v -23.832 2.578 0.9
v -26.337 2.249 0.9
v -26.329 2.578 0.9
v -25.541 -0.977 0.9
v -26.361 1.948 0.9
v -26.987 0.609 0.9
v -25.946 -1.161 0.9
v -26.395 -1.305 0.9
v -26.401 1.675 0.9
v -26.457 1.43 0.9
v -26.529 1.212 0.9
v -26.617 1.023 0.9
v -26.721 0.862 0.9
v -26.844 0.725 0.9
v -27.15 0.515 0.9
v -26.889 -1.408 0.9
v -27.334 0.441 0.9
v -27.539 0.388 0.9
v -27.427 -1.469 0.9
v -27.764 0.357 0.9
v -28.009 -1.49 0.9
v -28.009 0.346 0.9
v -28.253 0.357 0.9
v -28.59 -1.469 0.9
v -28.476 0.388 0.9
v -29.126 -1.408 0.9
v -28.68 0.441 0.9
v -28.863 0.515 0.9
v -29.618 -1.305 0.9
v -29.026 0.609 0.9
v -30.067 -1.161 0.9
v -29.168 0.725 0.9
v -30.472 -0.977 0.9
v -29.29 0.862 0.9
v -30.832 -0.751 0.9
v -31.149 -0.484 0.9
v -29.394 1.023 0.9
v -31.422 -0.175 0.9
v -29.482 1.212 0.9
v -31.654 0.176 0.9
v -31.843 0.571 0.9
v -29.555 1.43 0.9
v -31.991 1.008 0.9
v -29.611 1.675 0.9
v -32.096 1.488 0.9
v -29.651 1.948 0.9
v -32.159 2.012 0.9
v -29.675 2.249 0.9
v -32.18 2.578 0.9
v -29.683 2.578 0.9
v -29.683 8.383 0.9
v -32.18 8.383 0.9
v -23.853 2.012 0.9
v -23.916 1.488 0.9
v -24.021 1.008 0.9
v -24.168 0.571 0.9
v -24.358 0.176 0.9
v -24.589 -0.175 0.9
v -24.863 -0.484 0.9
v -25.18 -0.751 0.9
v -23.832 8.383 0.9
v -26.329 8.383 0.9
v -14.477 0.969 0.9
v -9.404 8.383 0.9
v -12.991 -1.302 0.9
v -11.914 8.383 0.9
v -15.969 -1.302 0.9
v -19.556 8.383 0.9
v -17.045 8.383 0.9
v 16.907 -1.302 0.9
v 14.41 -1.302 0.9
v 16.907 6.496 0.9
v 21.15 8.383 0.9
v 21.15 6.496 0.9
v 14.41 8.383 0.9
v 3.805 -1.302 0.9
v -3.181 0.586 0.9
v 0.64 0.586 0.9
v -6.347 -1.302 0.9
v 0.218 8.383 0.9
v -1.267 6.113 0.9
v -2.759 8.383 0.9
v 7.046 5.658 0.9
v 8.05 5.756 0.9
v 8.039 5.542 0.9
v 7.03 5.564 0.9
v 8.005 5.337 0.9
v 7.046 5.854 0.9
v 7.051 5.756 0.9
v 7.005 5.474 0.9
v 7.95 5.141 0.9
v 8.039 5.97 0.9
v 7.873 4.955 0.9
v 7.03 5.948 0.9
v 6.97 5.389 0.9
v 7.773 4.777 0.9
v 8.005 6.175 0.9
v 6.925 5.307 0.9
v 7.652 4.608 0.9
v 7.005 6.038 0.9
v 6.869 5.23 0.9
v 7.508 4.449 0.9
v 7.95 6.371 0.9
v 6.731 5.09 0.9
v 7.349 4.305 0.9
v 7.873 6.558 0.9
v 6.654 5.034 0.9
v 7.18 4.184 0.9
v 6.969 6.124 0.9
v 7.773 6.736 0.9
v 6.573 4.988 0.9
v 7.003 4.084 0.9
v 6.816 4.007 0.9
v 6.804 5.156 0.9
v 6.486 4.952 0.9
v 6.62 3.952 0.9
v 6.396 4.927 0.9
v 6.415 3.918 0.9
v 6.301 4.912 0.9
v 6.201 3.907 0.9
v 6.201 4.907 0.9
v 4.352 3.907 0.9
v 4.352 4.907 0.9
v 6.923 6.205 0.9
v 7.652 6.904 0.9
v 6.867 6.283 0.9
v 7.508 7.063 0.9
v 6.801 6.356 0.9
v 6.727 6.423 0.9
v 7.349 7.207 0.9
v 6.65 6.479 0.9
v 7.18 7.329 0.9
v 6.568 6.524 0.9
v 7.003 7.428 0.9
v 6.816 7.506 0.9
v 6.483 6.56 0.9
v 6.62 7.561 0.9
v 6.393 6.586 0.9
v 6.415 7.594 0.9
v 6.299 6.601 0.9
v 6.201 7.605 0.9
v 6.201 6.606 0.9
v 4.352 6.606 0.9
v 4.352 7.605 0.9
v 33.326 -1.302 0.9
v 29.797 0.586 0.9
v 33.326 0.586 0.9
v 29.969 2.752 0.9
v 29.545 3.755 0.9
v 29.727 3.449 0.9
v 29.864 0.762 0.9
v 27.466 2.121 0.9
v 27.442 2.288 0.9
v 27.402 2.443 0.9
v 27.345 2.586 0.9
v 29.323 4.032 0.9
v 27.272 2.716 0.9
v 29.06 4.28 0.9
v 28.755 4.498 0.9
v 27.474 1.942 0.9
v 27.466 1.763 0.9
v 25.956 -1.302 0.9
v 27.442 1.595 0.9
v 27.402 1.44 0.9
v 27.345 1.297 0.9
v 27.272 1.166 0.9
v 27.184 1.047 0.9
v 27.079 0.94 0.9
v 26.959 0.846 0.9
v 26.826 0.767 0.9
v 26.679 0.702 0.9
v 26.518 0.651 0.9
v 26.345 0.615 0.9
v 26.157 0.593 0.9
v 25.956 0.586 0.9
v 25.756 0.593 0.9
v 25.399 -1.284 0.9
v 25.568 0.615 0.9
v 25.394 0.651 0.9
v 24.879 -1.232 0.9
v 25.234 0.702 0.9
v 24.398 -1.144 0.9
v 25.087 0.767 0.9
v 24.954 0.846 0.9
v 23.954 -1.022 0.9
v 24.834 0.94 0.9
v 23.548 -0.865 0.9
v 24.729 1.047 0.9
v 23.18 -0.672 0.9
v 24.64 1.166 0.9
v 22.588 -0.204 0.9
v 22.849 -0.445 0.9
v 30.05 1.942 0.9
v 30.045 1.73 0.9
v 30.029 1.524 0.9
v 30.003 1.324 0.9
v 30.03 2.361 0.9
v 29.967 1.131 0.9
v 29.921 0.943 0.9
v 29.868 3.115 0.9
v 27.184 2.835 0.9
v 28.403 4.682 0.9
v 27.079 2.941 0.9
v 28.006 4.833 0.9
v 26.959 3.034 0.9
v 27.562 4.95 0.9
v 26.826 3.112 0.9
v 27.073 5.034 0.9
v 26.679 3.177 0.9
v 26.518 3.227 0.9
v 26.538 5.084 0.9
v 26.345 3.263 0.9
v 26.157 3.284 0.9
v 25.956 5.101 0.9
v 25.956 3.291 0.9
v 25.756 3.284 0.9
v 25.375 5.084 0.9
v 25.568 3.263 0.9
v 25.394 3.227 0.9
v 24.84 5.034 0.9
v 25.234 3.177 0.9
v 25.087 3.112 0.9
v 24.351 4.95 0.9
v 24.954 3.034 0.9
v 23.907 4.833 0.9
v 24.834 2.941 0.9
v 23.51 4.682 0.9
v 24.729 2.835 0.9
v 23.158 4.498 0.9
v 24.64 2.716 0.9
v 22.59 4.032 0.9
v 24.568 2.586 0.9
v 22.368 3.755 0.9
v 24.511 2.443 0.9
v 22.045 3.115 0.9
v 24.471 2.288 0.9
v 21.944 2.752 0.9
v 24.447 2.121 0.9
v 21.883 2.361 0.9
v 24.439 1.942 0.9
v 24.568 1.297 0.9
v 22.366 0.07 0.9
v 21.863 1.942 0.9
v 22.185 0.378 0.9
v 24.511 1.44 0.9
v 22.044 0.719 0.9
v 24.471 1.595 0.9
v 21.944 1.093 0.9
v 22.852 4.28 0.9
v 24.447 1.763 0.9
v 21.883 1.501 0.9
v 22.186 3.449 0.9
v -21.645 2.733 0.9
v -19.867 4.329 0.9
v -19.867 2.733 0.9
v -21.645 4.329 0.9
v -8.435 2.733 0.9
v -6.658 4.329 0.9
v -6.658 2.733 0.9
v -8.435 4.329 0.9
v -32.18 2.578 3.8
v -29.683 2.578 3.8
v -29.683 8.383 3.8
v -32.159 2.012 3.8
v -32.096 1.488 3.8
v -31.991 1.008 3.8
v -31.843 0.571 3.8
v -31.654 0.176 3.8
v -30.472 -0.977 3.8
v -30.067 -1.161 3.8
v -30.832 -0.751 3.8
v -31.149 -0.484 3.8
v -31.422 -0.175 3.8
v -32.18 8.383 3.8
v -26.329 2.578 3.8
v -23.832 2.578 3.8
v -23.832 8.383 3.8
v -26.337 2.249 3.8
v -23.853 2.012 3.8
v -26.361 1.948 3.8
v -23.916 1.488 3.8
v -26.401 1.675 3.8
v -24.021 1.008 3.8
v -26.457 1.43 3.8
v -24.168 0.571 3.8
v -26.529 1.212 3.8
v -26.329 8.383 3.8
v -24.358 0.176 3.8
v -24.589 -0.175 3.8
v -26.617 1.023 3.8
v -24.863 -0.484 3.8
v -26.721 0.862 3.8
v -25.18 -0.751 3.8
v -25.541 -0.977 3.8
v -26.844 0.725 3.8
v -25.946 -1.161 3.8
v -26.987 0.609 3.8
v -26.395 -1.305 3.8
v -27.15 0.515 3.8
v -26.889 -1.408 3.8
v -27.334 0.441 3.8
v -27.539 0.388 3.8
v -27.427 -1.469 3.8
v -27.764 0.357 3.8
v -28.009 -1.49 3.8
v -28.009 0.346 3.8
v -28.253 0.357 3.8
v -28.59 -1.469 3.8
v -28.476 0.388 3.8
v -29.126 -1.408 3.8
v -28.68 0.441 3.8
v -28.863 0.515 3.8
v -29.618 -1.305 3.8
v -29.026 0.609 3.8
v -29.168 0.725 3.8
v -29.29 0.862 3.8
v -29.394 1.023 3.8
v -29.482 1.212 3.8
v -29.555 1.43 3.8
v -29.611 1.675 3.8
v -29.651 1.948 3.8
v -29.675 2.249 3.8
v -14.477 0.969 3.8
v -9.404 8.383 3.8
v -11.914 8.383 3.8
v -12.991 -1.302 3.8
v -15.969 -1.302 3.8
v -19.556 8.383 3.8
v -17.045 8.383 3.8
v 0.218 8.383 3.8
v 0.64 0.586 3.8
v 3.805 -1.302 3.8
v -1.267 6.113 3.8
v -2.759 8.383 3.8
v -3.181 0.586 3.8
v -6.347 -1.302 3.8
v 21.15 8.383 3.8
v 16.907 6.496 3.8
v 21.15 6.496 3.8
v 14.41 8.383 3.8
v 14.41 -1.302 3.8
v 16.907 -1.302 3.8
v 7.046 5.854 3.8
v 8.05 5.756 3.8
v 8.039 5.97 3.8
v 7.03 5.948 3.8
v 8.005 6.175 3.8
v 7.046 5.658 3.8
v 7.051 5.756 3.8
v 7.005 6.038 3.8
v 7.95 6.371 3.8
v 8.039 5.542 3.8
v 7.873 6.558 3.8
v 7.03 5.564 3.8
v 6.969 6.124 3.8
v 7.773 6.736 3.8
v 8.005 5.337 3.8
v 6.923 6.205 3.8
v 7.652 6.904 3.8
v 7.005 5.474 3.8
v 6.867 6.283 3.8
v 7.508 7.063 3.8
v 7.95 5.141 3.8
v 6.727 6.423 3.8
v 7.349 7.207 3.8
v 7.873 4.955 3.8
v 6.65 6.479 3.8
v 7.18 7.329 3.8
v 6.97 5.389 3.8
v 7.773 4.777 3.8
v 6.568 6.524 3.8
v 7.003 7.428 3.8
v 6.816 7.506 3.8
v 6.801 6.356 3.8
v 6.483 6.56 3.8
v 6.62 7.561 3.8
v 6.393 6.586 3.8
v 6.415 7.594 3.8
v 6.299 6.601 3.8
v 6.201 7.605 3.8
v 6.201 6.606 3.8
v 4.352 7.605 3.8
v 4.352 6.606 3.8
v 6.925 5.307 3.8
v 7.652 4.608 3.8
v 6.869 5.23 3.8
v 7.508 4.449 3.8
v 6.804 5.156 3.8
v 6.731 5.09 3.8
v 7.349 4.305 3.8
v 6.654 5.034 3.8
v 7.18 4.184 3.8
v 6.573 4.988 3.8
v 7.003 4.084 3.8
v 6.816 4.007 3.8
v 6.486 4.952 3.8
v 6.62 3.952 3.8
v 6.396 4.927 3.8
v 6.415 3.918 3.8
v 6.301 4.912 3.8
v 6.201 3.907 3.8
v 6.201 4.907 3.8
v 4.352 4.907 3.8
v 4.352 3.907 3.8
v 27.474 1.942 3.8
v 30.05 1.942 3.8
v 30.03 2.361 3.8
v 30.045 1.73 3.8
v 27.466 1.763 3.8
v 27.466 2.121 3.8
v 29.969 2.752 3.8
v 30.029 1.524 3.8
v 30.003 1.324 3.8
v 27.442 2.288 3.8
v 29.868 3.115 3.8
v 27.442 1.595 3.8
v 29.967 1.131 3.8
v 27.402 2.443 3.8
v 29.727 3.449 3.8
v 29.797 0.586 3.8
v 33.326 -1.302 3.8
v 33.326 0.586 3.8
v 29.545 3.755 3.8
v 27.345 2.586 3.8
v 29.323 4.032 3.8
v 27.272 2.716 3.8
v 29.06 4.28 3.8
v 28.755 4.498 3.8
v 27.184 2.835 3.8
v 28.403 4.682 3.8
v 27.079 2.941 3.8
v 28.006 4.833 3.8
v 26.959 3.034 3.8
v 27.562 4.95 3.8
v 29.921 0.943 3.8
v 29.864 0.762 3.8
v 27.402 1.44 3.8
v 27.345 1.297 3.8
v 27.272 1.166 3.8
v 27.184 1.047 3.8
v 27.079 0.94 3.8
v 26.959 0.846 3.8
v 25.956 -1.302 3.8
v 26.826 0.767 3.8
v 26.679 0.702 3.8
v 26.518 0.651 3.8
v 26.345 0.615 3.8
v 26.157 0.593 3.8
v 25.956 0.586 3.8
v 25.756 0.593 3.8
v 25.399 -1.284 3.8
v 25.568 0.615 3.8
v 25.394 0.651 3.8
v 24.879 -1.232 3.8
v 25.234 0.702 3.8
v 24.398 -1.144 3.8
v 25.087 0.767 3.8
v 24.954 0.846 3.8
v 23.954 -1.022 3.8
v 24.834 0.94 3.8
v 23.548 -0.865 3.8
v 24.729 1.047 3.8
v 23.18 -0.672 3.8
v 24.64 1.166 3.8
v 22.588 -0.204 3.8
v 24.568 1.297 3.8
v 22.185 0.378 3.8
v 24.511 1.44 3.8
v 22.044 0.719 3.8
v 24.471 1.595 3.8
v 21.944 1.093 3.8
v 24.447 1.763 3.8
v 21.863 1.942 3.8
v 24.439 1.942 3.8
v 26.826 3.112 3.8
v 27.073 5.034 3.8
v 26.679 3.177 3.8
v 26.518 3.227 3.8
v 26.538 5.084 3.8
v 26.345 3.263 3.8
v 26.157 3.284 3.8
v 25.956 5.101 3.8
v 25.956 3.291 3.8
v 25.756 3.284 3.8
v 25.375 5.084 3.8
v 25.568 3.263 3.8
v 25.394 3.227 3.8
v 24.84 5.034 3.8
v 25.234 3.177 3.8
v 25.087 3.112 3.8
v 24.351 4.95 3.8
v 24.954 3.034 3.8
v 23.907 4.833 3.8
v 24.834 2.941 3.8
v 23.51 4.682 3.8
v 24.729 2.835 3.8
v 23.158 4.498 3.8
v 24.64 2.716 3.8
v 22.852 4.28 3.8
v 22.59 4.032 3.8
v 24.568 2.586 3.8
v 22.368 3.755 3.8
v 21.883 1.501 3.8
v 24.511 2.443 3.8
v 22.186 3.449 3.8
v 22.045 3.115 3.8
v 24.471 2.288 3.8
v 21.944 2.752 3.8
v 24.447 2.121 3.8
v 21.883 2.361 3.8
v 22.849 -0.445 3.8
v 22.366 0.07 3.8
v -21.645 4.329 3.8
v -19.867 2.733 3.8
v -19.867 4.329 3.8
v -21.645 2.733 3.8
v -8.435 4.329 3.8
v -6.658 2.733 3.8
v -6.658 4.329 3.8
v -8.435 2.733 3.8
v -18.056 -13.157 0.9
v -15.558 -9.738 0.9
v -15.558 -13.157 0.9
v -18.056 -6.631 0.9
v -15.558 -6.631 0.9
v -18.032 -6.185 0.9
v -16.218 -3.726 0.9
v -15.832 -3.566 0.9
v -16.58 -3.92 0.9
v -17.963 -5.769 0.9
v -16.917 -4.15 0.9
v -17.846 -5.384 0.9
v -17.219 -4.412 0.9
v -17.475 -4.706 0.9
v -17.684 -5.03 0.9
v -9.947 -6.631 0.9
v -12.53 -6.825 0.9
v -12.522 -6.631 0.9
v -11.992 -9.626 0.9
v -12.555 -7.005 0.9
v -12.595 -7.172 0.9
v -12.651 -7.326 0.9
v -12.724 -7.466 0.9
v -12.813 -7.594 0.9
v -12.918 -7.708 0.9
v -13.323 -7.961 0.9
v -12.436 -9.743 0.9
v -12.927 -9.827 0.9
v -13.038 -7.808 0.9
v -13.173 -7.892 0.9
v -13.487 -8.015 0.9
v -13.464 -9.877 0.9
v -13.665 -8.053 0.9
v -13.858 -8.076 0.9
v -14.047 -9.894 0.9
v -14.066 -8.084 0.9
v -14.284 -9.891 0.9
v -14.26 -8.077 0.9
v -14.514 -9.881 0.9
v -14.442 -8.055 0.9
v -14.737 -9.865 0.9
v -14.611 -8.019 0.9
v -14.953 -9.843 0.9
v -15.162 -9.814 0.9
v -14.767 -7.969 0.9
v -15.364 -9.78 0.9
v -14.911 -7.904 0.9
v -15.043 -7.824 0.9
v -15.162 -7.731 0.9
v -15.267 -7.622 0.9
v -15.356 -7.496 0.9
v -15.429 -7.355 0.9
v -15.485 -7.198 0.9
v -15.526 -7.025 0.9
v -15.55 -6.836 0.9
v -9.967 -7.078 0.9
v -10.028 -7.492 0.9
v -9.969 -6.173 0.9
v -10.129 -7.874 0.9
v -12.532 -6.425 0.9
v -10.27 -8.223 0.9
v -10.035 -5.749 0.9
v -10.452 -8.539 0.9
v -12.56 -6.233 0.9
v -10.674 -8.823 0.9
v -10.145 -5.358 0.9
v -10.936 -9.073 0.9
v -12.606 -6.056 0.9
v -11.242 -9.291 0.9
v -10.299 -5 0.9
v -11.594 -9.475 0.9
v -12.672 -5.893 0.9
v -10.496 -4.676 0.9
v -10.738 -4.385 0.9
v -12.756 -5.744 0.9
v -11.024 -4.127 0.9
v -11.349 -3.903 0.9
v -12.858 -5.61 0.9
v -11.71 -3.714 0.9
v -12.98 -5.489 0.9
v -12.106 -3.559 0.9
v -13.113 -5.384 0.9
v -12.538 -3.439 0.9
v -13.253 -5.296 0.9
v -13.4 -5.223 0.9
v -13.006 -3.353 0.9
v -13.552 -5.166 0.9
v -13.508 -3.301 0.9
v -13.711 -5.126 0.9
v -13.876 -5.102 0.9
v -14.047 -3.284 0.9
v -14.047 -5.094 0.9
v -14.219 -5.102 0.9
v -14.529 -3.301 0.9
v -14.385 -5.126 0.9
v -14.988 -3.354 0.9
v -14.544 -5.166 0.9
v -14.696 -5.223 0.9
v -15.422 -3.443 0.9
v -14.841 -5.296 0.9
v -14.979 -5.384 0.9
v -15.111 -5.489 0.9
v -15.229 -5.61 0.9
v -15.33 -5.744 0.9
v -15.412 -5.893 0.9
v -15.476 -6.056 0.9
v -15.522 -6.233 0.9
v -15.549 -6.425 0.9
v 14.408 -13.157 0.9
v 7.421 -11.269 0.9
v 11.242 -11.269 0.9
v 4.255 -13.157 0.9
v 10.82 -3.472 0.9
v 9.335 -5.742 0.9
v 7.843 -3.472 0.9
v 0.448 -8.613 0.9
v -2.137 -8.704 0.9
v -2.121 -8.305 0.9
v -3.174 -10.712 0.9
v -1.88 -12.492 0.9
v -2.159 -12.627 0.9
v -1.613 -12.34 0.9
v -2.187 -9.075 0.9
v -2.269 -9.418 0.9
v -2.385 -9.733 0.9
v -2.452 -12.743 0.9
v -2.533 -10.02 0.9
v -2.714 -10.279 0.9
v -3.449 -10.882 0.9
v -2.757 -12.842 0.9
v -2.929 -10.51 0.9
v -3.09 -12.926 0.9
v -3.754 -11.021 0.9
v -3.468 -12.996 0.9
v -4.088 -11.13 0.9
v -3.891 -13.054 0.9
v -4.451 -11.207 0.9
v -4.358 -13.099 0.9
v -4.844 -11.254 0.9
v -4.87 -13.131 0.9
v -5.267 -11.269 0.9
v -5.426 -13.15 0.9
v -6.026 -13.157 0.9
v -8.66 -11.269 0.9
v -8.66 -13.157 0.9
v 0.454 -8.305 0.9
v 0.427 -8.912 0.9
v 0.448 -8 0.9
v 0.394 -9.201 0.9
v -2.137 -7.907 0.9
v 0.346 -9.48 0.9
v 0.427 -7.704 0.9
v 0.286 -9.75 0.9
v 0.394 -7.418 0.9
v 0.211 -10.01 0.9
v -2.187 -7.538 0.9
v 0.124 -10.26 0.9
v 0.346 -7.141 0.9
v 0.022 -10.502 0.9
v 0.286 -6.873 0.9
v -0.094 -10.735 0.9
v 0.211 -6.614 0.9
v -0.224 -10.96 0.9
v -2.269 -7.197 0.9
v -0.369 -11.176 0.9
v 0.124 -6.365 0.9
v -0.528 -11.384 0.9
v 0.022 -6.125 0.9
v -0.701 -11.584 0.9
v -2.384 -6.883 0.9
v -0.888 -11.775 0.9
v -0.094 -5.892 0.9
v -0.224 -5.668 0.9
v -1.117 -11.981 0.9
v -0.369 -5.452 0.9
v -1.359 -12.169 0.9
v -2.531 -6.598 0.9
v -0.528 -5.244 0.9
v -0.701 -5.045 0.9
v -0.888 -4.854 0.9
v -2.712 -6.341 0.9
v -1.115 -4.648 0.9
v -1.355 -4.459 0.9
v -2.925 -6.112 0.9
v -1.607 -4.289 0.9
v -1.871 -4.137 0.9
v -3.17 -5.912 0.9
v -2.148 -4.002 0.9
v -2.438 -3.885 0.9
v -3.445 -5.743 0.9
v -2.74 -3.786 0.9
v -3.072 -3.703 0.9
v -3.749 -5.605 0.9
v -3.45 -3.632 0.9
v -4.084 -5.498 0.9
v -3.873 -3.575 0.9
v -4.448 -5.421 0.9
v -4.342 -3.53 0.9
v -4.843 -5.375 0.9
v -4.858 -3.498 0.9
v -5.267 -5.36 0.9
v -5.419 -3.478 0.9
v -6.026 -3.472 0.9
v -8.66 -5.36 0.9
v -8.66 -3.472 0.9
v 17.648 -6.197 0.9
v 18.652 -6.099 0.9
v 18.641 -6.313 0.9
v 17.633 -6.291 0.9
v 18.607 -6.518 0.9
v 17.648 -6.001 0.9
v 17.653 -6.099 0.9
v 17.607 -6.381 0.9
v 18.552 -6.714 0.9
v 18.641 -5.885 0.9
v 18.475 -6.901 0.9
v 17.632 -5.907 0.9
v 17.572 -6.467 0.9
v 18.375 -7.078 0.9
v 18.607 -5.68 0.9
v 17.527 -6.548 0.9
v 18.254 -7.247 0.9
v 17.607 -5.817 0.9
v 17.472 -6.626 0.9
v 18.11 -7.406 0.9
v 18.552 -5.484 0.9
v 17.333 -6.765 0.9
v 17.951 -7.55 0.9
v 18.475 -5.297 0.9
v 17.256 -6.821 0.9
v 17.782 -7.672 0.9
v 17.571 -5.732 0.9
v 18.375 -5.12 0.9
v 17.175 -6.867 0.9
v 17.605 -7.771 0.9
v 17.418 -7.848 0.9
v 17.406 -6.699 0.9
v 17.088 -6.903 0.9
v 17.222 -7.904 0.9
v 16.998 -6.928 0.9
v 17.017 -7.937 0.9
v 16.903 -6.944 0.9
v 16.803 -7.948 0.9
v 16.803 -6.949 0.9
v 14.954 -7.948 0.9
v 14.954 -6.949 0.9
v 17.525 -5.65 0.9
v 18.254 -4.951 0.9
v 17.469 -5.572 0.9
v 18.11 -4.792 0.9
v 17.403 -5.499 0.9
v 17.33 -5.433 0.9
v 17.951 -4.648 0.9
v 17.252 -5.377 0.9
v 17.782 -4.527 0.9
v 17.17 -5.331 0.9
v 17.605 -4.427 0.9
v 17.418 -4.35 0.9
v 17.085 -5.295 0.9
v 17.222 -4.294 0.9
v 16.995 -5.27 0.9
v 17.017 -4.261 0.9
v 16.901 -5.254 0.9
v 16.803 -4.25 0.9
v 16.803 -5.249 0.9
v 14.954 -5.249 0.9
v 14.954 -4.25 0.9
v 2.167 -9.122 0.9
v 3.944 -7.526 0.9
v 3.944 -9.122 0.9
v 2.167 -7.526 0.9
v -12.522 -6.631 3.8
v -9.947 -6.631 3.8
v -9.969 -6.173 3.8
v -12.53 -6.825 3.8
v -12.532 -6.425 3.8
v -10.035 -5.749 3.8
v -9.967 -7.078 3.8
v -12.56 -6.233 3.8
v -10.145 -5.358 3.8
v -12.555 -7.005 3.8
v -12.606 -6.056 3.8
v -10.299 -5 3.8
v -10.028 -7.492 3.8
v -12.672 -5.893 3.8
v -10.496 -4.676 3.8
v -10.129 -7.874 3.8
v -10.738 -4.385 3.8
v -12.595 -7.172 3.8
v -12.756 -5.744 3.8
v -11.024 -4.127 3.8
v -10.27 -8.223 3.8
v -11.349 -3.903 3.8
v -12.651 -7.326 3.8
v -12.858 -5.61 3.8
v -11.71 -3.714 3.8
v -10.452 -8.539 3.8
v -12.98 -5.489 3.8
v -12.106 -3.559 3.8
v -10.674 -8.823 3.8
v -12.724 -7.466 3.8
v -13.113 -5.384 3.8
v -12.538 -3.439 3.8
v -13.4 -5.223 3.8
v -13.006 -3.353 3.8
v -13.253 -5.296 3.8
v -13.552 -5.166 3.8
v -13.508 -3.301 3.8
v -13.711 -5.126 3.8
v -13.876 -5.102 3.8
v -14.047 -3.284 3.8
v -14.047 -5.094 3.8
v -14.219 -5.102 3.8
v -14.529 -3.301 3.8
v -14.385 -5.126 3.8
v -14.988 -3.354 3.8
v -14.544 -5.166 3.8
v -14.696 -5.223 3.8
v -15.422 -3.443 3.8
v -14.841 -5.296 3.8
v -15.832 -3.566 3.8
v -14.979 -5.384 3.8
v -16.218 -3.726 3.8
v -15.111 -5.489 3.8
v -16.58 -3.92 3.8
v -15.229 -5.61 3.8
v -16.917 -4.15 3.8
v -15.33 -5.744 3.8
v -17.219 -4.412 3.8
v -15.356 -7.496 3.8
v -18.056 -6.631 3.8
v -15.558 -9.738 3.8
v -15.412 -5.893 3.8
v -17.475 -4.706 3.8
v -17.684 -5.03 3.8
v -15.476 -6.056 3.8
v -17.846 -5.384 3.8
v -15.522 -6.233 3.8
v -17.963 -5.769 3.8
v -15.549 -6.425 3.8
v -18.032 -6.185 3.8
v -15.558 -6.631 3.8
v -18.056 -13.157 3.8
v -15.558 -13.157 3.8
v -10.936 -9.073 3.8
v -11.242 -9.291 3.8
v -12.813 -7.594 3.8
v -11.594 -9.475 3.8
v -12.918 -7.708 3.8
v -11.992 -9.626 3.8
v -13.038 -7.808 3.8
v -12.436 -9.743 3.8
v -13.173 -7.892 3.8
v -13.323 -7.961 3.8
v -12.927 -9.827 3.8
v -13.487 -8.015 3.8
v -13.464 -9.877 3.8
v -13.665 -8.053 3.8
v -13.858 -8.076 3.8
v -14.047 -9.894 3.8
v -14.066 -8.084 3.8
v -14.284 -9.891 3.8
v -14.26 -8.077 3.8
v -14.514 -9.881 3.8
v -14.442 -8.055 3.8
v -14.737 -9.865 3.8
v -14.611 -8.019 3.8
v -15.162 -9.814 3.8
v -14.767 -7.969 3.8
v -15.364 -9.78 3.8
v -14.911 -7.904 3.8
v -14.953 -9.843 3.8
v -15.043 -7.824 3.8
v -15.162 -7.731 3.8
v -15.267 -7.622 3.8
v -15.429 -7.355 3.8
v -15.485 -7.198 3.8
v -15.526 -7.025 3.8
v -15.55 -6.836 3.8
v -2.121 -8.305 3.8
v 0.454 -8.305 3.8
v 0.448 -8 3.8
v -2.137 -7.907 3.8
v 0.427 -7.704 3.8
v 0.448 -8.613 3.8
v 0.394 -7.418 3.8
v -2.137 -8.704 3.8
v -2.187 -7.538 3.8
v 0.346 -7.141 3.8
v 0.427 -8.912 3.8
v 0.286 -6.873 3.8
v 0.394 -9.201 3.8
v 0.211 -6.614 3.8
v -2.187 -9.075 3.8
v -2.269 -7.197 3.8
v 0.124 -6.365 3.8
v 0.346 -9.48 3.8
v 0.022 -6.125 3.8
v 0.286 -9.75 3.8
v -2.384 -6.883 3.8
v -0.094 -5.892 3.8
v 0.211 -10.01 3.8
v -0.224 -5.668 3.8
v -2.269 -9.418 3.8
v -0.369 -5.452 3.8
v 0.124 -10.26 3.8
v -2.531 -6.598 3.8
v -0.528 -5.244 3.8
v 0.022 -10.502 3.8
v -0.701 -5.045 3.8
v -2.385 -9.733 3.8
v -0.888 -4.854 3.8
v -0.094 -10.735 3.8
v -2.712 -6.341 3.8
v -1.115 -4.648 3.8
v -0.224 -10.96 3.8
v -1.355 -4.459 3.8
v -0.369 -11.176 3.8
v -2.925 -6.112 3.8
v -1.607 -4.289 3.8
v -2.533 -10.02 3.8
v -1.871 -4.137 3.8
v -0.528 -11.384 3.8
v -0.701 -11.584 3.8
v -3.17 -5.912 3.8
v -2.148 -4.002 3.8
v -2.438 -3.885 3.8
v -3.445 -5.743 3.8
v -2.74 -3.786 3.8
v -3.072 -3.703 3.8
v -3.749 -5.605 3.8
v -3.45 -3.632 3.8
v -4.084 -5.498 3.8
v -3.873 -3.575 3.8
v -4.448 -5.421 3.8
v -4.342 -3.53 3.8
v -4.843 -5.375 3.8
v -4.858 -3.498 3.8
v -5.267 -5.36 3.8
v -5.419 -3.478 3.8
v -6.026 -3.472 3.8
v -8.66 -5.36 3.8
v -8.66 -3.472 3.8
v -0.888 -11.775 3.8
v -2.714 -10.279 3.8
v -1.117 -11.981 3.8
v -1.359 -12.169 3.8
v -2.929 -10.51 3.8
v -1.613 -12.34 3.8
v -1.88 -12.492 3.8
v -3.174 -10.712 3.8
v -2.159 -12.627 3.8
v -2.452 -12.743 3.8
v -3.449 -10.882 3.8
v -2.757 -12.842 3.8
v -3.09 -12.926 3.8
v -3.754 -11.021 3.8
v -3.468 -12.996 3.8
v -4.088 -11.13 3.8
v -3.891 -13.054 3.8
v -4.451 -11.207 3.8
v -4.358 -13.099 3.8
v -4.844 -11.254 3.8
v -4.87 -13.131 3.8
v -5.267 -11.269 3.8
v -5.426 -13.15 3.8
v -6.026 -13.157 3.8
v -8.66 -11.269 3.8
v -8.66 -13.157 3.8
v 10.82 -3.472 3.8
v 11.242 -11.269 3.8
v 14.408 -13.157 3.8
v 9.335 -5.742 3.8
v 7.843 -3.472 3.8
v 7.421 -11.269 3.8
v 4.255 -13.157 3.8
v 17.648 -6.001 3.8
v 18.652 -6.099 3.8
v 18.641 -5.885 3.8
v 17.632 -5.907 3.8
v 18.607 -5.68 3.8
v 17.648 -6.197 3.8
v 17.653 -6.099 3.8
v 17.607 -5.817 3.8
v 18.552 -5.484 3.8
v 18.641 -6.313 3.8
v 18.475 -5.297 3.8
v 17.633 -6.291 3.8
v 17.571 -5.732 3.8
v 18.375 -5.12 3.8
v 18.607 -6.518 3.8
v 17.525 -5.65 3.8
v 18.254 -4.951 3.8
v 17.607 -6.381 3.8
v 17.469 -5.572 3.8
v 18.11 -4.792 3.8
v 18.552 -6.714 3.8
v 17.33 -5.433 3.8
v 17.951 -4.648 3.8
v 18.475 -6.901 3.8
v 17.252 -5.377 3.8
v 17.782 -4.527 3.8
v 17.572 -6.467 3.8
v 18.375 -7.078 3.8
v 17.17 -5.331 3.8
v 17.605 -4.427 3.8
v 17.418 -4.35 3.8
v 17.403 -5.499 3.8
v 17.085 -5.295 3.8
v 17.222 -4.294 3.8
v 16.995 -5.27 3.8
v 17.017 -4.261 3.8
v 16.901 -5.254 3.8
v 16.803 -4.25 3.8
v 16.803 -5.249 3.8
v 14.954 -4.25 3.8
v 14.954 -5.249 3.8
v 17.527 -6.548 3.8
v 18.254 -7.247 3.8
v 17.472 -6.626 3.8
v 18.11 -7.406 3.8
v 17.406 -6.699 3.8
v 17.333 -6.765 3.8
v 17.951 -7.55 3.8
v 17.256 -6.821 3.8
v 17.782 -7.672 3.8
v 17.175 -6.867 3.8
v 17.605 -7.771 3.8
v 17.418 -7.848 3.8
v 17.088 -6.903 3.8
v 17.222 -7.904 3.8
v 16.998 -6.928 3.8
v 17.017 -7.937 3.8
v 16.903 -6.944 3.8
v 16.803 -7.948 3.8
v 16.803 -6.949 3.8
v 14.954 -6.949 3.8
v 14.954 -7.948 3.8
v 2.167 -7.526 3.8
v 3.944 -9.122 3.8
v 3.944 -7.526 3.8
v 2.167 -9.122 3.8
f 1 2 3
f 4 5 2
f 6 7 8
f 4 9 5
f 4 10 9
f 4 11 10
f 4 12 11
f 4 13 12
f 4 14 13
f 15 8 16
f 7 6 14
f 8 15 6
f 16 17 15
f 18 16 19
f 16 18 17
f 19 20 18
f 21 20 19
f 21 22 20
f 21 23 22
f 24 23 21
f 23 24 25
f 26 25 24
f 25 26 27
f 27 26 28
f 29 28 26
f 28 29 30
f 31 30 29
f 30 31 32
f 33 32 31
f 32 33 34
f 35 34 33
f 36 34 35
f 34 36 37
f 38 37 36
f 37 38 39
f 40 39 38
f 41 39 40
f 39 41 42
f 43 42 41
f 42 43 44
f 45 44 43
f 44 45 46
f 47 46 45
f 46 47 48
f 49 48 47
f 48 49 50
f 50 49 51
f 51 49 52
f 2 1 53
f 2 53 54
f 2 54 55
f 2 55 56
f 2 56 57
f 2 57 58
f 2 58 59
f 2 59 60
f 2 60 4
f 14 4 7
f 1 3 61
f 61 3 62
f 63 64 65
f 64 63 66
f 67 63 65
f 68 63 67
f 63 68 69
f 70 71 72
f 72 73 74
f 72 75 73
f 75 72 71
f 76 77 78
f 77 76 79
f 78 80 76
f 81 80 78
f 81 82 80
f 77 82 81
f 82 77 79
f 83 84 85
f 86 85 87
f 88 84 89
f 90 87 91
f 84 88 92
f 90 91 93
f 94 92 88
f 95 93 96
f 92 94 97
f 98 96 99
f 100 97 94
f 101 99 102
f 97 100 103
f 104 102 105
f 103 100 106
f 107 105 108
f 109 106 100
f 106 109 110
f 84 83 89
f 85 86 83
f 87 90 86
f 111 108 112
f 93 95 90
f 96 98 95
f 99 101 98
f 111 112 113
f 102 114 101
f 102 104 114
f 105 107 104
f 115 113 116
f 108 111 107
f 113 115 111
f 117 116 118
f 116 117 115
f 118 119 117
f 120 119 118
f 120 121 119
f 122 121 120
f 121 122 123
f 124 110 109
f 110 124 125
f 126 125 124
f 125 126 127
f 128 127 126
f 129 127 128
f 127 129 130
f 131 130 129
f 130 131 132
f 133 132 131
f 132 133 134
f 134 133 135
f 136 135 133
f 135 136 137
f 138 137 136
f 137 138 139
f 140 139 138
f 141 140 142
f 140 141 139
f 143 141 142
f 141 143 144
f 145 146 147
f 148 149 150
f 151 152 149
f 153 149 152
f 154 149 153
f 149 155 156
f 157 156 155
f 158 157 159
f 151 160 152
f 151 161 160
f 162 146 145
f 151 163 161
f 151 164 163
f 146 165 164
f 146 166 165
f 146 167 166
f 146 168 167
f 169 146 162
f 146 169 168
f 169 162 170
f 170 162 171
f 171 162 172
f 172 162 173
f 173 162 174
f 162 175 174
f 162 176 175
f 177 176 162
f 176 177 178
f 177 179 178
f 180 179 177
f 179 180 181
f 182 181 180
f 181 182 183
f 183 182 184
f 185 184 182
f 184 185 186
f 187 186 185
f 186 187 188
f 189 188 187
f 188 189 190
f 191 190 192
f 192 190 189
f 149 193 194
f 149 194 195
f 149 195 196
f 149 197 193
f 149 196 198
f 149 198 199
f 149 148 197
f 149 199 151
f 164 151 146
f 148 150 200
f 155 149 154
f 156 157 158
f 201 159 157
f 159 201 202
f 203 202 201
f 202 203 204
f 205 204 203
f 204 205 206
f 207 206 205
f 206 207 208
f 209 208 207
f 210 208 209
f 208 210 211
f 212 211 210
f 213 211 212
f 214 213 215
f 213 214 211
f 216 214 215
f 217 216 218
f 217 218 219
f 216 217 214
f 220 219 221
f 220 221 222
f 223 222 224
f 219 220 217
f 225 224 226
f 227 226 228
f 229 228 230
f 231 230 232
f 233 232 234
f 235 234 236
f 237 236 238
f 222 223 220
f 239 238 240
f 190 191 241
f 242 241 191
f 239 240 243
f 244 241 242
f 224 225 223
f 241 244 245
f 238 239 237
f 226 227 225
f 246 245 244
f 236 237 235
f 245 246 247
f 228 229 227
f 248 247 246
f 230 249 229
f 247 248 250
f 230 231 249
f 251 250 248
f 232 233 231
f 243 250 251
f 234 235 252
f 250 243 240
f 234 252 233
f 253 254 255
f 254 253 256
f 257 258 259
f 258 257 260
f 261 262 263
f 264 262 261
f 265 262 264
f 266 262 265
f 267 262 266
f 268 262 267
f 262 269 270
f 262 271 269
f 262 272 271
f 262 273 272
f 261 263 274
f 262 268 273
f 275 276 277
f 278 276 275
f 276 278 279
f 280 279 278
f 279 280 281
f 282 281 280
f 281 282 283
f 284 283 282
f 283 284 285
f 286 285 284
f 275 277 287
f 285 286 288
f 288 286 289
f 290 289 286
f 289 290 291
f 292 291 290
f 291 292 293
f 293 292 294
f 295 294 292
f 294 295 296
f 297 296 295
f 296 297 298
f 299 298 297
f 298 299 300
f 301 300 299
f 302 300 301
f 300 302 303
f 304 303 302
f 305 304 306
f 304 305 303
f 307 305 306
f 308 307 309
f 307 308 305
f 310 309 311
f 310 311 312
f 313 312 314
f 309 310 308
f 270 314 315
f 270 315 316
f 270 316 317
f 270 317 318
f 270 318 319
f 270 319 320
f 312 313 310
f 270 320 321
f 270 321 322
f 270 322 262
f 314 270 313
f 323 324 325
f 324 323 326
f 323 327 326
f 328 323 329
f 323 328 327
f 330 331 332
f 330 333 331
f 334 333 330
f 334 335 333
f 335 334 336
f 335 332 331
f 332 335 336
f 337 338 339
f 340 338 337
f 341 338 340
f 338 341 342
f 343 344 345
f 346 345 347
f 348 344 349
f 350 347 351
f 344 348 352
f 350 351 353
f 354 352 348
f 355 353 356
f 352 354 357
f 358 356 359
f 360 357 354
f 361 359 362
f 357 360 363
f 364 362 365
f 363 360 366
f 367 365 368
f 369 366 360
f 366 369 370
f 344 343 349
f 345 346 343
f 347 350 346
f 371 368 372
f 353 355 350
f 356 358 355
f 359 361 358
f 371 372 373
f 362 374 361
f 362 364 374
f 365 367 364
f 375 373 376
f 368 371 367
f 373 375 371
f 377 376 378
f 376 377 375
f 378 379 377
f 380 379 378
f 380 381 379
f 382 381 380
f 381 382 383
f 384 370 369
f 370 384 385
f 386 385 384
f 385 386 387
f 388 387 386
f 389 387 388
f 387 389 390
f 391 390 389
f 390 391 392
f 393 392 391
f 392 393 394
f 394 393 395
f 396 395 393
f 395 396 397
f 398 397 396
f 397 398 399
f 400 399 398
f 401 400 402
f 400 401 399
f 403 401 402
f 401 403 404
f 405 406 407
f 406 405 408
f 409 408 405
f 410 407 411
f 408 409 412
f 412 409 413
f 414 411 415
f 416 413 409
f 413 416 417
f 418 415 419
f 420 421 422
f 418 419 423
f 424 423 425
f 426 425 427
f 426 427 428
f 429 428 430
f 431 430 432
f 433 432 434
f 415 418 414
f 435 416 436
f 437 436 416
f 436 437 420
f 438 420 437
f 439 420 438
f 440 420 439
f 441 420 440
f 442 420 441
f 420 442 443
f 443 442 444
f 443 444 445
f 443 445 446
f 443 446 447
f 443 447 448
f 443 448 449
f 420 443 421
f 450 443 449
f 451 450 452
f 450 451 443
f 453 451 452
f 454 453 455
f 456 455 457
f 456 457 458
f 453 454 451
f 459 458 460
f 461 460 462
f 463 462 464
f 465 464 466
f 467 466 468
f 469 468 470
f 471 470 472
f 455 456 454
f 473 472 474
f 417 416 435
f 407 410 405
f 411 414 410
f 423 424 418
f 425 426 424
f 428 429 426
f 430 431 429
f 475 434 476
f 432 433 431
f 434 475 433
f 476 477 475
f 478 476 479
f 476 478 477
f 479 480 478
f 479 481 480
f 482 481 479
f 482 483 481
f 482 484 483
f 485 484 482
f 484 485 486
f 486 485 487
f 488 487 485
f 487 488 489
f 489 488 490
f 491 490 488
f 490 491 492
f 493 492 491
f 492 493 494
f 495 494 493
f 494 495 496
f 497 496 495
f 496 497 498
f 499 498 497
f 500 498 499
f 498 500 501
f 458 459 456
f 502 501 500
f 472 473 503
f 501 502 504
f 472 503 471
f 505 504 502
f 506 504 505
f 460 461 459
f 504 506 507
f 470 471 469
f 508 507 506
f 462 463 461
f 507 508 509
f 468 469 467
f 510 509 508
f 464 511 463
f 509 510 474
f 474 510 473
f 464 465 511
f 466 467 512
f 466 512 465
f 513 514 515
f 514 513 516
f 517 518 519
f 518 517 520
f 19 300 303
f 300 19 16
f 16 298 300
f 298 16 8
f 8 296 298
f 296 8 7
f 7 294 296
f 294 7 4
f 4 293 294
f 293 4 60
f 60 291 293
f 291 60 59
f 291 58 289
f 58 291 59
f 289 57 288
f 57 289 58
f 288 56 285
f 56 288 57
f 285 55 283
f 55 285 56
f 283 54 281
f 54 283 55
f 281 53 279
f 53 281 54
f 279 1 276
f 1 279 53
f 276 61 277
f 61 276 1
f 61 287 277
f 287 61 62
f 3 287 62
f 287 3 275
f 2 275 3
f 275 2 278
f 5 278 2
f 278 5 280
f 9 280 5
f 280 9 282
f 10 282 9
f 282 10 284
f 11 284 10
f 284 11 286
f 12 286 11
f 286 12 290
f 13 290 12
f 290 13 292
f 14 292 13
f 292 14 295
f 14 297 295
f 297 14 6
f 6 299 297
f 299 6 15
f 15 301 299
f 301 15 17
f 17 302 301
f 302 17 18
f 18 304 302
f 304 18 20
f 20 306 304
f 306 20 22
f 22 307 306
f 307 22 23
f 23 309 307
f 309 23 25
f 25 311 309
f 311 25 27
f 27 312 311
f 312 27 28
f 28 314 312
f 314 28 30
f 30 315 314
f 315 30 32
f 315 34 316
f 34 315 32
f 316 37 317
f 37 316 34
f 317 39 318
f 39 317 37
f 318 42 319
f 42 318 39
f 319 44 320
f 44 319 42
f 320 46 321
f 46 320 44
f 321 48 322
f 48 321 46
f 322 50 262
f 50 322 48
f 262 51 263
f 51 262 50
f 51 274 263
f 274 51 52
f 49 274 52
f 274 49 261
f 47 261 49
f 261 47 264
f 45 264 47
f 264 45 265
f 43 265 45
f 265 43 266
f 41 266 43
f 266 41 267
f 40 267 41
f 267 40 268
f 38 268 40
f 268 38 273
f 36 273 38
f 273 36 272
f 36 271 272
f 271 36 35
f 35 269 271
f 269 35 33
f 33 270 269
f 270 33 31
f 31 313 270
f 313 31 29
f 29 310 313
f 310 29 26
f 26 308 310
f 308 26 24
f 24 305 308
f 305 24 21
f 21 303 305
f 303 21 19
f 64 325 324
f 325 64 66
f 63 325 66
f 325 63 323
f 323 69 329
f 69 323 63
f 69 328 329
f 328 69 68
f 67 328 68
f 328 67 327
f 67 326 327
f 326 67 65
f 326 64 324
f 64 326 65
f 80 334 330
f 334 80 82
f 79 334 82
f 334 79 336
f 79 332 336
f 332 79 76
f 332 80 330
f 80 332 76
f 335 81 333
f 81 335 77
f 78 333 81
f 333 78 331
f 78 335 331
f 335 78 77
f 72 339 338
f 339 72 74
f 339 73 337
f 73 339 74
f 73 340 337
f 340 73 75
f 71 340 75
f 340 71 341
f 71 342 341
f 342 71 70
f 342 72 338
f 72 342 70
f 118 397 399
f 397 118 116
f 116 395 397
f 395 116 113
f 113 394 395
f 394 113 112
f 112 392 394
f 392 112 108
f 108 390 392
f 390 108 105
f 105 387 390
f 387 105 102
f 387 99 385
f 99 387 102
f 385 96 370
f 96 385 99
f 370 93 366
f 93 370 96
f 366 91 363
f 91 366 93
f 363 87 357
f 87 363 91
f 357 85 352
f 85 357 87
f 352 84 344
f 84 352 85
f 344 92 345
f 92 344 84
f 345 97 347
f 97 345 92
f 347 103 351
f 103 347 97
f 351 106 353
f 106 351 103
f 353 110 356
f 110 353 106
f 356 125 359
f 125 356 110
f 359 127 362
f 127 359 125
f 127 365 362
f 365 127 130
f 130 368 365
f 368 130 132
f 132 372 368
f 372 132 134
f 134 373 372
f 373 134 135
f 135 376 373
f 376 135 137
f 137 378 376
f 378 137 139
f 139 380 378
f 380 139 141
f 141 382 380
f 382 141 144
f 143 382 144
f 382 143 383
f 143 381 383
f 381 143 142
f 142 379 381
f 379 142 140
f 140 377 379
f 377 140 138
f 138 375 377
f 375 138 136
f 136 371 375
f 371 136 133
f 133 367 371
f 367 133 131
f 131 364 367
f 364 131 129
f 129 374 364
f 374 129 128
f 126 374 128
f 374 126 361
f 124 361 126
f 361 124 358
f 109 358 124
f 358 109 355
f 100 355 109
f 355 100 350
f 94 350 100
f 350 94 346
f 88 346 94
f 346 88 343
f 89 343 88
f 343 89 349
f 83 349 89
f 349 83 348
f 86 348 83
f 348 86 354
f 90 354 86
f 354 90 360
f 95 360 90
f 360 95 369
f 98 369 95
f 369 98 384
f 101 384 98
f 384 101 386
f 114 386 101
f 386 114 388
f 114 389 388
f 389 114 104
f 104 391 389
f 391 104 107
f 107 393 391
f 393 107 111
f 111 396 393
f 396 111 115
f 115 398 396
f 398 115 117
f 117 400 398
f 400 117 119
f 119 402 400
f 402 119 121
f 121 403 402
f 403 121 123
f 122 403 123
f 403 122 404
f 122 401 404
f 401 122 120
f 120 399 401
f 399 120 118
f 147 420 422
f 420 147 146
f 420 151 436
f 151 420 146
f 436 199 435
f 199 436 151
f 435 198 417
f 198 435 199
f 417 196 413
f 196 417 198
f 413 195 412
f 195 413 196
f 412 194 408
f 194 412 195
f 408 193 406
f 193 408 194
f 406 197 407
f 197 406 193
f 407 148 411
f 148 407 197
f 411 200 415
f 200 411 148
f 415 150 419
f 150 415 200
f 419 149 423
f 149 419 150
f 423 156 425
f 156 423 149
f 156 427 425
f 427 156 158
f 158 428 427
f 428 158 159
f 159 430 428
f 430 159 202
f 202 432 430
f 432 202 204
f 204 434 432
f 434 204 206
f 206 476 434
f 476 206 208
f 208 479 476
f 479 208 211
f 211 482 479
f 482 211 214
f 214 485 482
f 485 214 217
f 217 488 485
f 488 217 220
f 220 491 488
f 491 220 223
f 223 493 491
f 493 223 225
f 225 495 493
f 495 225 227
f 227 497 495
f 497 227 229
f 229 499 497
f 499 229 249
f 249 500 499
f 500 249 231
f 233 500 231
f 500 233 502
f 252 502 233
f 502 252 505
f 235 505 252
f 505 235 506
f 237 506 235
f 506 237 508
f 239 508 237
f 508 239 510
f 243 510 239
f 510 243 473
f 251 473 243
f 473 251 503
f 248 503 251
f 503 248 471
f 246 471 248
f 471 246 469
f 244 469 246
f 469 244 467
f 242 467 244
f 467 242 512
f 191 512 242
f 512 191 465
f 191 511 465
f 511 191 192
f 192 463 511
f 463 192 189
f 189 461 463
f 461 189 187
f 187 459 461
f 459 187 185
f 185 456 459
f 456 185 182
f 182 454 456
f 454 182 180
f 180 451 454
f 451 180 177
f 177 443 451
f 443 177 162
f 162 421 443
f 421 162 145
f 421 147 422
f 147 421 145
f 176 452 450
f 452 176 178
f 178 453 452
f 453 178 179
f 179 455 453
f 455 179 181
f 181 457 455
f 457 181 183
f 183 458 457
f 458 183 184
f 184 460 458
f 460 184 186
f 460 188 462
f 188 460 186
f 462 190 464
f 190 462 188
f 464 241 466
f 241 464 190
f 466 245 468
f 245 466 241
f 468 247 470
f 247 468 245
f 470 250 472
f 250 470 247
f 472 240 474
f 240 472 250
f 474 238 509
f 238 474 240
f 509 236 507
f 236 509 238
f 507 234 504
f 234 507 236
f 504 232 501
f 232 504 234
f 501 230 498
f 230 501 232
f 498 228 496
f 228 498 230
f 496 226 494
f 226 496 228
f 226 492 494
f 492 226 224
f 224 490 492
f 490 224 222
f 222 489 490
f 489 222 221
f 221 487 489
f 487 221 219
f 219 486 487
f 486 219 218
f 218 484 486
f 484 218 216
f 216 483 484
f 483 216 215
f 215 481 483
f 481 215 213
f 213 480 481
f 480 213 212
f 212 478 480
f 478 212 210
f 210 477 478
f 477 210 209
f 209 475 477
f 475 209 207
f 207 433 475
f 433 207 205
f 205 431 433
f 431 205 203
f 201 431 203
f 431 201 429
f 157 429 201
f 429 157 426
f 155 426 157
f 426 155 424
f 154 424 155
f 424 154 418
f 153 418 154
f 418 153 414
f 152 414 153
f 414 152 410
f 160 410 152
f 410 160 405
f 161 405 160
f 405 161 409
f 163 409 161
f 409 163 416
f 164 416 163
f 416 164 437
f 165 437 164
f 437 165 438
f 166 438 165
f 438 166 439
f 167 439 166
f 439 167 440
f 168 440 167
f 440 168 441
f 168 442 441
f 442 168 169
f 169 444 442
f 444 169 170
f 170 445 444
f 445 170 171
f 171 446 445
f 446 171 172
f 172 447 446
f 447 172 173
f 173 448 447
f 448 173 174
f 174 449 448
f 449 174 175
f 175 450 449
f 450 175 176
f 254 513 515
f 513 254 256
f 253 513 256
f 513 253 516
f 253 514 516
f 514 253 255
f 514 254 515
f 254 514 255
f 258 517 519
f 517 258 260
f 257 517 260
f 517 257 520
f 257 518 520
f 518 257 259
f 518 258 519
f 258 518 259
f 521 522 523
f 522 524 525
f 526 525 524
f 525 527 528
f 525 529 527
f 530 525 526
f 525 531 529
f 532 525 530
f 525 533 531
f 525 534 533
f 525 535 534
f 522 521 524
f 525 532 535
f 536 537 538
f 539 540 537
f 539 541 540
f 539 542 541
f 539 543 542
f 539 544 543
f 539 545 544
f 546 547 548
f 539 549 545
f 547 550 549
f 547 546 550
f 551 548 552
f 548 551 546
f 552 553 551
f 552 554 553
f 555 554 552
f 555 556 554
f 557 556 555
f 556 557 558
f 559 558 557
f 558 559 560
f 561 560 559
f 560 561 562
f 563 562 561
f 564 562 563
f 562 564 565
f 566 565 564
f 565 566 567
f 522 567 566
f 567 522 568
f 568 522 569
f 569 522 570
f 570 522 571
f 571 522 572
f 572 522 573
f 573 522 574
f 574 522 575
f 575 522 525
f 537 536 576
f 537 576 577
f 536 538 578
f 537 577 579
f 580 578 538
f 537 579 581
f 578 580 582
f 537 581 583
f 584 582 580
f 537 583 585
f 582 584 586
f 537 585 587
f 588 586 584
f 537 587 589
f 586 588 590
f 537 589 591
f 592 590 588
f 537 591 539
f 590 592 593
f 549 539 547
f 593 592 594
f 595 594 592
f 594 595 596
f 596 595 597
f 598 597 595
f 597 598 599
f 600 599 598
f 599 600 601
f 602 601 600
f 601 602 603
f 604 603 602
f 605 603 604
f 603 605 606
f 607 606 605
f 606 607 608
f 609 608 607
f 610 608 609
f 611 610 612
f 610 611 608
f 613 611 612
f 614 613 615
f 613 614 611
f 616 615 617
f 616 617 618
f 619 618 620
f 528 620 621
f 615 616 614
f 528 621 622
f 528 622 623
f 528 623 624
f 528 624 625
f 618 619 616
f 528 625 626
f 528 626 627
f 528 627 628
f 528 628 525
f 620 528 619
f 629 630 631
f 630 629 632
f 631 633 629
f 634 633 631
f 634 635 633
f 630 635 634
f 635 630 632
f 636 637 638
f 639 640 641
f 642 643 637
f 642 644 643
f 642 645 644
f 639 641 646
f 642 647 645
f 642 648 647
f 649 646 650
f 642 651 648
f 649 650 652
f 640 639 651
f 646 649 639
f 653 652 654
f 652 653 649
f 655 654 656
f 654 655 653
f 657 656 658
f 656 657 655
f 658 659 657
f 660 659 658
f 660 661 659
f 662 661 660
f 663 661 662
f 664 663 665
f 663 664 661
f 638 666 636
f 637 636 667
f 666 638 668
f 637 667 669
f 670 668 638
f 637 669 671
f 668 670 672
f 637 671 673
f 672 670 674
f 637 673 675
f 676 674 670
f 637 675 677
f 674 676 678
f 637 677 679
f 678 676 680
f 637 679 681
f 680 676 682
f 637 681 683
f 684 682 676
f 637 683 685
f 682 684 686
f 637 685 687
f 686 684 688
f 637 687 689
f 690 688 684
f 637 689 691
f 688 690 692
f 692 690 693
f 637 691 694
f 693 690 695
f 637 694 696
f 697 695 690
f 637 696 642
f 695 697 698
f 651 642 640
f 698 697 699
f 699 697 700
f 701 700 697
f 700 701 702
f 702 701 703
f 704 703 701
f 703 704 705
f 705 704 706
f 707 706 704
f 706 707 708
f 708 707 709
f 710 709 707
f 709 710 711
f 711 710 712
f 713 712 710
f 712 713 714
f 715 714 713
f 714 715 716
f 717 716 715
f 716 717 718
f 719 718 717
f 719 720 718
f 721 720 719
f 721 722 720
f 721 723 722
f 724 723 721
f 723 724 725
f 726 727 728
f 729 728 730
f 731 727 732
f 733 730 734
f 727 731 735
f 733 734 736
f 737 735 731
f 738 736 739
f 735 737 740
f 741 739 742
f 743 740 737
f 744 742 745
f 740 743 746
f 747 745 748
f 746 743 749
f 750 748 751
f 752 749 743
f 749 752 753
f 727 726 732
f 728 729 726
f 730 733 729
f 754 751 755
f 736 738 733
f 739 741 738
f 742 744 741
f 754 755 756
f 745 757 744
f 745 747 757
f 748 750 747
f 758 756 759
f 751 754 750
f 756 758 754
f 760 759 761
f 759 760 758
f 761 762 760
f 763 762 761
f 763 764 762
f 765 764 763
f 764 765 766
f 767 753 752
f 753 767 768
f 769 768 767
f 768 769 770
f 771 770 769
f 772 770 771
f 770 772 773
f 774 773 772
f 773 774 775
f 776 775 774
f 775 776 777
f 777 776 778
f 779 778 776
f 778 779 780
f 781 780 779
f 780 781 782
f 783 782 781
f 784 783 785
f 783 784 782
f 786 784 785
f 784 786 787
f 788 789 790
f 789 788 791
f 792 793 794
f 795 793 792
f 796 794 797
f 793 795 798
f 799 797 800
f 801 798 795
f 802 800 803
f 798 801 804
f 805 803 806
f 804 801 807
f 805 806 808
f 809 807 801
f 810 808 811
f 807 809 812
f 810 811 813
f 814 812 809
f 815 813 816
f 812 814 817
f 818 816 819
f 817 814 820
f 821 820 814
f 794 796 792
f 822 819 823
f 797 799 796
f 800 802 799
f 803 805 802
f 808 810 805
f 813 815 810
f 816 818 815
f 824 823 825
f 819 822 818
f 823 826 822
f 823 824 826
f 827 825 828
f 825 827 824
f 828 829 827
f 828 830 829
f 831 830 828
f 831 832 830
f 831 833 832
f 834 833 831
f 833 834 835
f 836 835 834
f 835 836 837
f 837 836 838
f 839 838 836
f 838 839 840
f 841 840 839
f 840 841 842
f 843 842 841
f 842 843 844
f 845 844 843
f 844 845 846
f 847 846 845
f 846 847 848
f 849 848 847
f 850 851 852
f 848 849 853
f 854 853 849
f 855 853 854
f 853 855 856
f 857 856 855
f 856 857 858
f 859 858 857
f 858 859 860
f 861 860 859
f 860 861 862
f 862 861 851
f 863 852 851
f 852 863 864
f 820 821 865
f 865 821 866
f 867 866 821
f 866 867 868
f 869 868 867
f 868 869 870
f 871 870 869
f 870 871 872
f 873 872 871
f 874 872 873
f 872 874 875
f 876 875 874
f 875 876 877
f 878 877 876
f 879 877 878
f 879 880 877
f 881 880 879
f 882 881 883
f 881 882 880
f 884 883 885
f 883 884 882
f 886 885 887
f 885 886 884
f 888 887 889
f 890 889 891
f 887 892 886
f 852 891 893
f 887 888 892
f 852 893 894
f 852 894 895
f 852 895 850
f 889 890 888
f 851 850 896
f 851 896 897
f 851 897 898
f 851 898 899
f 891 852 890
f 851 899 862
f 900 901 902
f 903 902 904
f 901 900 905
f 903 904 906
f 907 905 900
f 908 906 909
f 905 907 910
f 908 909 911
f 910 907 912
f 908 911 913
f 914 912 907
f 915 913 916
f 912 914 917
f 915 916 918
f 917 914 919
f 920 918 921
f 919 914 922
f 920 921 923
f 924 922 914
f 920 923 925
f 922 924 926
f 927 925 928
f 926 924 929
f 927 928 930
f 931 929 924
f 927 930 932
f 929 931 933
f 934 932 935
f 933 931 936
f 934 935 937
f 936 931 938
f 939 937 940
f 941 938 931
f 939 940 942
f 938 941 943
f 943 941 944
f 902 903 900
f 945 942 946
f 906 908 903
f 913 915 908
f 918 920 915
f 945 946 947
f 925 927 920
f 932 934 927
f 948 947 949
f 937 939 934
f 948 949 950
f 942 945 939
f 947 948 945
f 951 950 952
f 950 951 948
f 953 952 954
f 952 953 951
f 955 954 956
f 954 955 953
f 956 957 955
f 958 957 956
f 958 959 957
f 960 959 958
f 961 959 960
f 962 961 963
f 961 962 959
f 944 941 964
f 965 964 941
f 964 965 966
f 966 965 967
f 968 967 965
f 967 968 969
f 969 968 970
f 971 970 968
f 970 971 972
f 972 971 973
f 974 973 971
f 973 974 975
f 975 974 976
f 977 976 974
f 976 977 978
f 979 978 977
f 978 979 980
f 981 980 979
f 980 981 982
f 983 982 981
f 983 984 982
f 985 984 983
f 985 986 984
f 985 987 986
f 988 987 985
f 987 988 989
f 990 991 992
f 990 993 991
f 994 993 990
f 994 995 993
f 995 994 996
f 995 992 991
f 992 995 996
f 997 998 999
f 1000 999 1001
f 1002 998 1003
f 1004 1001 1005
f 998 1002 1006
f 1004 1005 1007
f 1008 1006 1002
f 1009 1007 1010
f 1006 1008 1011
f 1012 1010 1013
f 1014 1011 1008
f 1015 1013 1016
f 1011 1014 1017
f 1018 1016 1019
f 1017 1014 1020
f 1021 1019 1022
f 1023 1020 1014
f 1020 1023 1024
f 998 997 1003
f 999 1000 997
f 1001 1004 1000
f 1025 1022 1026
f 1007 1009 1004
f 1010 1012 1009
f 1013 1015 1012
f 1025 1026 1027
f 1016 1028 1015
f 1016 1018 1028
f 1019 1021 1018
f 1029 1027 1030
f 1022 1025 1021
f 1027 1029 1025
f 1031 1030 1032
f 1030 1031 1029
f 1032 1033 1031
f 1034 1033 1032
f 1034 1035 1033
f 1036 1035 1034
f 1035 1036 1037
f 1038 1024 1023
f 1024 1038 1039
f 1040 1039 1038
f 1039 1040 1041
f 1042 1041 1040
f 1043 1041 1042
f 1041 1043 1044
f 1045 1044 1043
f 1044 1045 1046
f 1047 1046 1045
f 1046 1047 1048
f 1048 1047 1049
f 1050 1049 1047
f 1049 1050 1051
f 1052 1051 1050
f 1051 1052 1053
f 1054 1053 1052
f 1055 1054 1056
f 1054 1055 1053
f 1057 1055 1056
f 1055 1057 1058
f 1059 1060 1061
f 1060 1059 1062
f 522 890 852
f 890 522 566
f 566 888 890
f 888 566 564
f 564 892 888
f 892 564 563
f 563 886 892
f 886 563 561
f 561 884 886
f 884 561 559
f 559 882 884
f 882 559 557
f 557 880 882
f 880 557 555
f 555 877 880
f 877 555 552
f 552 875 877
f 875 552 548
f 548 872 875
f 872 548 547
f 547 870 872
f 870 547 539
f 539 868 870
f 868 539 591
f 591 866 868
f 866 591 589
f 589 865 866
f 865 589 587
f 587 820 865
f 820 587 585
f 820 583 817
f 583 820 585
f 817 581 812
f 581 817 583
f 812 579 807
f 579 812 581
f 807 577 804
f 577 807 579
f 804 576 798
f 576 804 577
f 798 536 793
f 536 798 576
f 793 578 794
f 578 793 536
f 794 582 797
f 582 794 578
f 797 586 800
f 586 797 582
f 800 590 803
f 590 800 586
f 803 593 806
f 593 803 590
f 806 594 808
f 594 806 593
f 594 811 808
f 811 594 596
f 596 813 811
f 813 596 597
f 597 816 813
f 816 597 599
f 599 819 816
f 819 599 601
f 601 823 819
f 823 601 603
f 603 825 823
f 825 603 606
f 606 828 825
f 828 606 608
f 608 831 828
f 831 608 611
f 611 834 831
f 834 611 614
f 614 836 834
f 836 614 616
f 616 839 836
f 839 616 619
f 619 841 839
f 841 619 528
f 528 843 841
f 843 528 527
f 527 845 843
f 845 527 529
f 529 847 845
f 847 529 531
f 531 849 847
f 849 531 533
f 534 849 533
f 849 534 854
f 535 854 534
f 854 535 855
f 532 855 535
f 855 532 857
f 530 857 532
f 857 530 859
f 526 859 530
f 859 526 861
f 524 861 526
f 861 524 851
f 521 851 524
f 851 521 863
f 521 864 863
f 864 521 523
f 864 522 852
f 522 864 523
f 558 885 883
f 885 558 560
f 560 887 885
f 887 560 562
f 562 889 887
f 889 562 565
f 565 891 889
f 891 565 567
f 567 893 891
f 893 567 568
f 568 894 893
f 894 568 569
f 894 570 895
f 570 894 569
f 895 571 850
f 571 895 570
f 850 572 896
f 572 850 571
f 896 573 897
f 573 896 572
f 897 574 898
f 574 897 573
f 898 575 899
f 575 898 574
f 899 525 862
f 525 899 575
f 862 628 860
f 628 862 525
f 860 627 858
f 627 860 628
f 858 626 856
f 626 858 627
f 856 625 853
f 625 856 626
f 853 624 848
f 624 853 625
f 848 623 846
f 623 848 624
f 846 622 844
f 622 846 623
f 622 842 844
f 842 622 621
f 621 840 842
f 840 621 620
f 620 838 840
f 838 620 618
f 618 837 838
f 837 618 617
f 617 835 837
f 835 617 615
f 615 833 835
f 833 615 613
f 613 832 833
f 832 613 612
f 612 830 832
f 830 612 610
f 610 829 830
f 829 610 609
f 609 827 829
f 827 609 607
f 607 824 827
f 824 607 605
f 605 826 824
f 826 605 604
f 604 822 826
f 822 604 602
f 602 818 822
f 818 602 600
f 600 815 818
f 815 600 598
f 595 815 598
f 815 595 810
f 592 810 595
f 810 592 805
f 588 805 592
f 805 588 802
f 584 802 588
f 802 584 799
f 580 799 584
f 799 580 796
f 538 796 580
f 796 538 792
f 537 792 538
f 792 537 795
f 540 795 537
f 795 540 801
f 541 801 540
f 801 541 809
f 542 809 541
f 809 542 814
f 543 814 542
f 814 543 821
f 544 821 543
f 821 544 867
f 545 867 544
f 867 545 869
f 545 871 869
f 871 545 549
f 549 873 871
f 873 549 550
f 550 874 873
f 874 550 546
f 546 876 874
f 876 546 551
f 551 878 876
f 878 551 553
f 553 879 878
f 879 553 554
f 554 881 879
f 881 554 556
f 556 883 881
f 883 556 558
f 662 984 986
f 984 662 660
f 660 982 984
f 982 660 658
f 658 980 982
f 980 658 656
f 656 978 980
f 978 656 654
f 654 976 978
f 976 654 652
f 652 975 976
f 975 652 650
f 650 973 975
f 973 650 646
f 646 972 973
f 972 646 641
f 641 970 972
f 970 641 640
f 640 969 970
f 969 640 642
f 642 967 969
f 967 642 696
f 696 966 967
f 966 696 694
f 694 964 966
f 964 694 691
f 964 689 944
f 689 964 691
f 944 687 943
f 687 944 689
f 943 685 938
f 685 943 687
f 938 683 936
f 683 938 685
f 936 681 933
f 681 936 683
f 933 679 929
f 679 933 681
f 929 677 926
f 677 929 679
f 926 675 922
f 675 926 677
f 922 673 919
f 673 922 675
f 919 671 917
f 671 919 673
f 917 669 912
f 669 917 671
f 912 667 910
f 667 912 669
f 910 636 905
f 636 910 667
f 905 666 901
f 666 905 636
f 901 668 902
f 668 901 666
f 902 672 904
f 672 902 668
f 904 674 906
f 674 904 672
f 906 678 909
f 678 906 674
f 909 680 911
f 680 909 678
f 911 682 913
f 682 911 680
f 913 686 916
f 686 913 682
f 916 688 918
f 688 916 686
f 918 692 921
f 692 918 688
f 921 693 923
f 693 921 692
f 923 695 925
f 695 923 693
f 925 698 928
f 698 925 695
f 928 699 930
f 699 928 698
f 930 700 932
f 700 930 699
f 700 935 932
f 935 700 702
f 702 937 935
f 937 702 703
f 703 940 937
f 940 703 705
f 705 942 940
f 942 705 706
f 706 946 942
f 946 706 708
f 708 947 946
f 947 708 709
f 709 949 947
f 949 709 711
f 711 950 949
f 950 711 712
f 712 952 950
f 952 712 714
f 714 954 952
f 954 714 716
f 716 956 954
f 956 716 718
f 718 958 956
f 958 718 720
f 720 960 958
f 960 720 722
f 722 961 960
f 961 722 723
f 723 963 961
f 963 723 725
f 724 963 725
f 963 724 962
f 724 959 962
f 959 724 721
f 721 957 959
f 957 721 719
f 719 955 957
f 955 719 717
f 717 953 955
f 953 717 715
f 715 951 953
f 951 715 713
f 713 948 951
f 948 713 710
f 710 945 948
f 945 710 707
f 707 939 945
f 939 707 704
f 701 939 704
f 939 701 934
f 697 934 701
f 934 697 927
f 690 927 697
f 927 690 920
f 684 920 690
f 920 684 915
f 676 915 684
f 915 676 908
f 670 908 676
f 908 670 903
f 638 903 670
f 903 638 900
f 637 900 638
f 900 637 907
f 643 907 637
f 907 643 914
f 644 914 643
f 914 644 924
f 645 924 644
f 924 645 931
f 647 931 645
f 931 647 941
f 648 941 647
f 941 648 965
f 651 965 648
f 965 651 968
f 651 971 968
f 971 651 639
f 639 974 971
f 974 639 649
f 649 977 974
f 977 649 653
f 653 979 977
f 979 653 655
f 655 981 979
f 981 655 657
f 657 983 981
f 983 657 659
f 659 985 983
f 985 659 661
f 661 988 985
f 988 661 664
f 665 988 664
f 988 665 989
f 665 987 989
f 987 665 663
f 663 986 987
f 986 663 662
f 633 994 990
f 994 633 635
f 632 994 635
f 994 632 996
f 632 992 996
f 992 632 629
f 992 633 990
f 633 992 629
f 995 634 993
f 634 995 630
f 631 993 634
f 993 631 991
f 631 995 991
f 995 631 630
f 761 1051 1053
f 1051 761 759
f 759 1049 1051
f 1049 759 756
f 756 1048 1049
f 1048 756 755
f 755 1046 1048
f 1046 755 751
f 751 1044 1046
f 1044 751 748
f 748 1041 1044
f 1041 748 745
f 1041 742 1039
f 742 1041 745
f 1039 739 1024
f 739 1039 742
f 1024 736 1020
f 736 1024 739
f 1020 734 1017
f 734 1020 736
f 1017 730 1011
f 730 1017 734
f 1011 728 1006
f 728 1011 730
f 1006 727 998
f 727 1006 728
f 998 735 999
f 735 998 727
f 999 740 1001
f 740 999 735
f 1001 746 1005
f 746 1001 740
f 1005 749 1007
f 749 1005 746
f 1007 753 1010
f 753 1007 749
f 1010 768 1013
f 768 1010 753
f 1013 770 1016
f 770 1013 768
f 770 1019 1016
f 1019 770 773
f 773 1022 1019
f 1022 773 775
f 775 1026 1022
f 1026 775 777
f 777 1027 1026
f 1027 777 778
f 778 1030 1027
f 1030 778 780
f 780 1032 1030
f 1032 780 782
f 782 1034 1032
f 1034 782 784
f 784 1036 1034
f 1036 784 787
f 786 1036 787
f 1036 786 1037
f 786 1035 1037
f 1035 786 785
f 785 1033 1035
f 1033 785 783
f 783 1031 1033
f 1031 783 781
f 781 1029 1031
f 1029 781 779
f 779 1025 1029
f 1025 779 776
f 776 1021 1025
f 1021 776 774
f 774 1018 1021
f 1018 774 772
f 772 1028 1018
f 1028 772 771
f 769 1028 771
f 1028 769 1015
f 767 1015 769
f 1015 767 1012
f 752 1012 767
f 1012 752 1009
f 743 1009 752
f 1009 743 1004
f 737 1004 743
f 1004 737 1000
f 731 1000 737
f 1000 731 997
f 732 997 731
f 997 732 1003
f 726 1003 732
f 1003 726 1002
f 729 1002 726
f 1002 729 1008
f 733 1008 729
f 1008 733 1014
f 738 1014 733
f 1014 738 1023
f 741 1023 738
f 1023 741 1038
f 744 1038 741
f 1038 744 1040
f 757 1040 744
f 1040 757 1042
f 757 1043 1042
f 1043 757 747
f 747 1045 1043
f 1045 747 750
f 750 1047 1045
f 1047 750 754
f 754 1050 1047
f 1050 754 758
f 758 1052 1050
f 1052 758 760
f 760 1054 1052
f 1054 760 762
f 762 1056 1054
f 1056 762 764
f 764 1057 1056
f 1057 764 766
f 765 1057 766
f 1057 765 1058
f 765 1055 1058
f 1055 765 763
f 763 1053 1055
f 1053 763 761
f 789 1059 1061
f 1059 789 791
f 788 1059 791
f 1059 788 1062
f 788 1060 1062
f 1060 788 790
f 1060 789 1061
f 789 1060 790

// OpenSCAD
$fn = 48;
  // syllabics (overlaid on icon, tallest)
  translate([0, 3.335, 0.900]) linear_extrude(height=2.900) text("ᑌᐺᐎᐣ ᒥᓇ", size=9.566, halign="center", valign="center", font="Euphemia UCAS:style=Bold");
  translate([0, -8.335, 0.900]) linear_extrude(height=2.900) text("ᑭᑐᐎᐣ", size=9.566, halign="center", valign="center", font="Euphemia UCAS:style=Bold");
